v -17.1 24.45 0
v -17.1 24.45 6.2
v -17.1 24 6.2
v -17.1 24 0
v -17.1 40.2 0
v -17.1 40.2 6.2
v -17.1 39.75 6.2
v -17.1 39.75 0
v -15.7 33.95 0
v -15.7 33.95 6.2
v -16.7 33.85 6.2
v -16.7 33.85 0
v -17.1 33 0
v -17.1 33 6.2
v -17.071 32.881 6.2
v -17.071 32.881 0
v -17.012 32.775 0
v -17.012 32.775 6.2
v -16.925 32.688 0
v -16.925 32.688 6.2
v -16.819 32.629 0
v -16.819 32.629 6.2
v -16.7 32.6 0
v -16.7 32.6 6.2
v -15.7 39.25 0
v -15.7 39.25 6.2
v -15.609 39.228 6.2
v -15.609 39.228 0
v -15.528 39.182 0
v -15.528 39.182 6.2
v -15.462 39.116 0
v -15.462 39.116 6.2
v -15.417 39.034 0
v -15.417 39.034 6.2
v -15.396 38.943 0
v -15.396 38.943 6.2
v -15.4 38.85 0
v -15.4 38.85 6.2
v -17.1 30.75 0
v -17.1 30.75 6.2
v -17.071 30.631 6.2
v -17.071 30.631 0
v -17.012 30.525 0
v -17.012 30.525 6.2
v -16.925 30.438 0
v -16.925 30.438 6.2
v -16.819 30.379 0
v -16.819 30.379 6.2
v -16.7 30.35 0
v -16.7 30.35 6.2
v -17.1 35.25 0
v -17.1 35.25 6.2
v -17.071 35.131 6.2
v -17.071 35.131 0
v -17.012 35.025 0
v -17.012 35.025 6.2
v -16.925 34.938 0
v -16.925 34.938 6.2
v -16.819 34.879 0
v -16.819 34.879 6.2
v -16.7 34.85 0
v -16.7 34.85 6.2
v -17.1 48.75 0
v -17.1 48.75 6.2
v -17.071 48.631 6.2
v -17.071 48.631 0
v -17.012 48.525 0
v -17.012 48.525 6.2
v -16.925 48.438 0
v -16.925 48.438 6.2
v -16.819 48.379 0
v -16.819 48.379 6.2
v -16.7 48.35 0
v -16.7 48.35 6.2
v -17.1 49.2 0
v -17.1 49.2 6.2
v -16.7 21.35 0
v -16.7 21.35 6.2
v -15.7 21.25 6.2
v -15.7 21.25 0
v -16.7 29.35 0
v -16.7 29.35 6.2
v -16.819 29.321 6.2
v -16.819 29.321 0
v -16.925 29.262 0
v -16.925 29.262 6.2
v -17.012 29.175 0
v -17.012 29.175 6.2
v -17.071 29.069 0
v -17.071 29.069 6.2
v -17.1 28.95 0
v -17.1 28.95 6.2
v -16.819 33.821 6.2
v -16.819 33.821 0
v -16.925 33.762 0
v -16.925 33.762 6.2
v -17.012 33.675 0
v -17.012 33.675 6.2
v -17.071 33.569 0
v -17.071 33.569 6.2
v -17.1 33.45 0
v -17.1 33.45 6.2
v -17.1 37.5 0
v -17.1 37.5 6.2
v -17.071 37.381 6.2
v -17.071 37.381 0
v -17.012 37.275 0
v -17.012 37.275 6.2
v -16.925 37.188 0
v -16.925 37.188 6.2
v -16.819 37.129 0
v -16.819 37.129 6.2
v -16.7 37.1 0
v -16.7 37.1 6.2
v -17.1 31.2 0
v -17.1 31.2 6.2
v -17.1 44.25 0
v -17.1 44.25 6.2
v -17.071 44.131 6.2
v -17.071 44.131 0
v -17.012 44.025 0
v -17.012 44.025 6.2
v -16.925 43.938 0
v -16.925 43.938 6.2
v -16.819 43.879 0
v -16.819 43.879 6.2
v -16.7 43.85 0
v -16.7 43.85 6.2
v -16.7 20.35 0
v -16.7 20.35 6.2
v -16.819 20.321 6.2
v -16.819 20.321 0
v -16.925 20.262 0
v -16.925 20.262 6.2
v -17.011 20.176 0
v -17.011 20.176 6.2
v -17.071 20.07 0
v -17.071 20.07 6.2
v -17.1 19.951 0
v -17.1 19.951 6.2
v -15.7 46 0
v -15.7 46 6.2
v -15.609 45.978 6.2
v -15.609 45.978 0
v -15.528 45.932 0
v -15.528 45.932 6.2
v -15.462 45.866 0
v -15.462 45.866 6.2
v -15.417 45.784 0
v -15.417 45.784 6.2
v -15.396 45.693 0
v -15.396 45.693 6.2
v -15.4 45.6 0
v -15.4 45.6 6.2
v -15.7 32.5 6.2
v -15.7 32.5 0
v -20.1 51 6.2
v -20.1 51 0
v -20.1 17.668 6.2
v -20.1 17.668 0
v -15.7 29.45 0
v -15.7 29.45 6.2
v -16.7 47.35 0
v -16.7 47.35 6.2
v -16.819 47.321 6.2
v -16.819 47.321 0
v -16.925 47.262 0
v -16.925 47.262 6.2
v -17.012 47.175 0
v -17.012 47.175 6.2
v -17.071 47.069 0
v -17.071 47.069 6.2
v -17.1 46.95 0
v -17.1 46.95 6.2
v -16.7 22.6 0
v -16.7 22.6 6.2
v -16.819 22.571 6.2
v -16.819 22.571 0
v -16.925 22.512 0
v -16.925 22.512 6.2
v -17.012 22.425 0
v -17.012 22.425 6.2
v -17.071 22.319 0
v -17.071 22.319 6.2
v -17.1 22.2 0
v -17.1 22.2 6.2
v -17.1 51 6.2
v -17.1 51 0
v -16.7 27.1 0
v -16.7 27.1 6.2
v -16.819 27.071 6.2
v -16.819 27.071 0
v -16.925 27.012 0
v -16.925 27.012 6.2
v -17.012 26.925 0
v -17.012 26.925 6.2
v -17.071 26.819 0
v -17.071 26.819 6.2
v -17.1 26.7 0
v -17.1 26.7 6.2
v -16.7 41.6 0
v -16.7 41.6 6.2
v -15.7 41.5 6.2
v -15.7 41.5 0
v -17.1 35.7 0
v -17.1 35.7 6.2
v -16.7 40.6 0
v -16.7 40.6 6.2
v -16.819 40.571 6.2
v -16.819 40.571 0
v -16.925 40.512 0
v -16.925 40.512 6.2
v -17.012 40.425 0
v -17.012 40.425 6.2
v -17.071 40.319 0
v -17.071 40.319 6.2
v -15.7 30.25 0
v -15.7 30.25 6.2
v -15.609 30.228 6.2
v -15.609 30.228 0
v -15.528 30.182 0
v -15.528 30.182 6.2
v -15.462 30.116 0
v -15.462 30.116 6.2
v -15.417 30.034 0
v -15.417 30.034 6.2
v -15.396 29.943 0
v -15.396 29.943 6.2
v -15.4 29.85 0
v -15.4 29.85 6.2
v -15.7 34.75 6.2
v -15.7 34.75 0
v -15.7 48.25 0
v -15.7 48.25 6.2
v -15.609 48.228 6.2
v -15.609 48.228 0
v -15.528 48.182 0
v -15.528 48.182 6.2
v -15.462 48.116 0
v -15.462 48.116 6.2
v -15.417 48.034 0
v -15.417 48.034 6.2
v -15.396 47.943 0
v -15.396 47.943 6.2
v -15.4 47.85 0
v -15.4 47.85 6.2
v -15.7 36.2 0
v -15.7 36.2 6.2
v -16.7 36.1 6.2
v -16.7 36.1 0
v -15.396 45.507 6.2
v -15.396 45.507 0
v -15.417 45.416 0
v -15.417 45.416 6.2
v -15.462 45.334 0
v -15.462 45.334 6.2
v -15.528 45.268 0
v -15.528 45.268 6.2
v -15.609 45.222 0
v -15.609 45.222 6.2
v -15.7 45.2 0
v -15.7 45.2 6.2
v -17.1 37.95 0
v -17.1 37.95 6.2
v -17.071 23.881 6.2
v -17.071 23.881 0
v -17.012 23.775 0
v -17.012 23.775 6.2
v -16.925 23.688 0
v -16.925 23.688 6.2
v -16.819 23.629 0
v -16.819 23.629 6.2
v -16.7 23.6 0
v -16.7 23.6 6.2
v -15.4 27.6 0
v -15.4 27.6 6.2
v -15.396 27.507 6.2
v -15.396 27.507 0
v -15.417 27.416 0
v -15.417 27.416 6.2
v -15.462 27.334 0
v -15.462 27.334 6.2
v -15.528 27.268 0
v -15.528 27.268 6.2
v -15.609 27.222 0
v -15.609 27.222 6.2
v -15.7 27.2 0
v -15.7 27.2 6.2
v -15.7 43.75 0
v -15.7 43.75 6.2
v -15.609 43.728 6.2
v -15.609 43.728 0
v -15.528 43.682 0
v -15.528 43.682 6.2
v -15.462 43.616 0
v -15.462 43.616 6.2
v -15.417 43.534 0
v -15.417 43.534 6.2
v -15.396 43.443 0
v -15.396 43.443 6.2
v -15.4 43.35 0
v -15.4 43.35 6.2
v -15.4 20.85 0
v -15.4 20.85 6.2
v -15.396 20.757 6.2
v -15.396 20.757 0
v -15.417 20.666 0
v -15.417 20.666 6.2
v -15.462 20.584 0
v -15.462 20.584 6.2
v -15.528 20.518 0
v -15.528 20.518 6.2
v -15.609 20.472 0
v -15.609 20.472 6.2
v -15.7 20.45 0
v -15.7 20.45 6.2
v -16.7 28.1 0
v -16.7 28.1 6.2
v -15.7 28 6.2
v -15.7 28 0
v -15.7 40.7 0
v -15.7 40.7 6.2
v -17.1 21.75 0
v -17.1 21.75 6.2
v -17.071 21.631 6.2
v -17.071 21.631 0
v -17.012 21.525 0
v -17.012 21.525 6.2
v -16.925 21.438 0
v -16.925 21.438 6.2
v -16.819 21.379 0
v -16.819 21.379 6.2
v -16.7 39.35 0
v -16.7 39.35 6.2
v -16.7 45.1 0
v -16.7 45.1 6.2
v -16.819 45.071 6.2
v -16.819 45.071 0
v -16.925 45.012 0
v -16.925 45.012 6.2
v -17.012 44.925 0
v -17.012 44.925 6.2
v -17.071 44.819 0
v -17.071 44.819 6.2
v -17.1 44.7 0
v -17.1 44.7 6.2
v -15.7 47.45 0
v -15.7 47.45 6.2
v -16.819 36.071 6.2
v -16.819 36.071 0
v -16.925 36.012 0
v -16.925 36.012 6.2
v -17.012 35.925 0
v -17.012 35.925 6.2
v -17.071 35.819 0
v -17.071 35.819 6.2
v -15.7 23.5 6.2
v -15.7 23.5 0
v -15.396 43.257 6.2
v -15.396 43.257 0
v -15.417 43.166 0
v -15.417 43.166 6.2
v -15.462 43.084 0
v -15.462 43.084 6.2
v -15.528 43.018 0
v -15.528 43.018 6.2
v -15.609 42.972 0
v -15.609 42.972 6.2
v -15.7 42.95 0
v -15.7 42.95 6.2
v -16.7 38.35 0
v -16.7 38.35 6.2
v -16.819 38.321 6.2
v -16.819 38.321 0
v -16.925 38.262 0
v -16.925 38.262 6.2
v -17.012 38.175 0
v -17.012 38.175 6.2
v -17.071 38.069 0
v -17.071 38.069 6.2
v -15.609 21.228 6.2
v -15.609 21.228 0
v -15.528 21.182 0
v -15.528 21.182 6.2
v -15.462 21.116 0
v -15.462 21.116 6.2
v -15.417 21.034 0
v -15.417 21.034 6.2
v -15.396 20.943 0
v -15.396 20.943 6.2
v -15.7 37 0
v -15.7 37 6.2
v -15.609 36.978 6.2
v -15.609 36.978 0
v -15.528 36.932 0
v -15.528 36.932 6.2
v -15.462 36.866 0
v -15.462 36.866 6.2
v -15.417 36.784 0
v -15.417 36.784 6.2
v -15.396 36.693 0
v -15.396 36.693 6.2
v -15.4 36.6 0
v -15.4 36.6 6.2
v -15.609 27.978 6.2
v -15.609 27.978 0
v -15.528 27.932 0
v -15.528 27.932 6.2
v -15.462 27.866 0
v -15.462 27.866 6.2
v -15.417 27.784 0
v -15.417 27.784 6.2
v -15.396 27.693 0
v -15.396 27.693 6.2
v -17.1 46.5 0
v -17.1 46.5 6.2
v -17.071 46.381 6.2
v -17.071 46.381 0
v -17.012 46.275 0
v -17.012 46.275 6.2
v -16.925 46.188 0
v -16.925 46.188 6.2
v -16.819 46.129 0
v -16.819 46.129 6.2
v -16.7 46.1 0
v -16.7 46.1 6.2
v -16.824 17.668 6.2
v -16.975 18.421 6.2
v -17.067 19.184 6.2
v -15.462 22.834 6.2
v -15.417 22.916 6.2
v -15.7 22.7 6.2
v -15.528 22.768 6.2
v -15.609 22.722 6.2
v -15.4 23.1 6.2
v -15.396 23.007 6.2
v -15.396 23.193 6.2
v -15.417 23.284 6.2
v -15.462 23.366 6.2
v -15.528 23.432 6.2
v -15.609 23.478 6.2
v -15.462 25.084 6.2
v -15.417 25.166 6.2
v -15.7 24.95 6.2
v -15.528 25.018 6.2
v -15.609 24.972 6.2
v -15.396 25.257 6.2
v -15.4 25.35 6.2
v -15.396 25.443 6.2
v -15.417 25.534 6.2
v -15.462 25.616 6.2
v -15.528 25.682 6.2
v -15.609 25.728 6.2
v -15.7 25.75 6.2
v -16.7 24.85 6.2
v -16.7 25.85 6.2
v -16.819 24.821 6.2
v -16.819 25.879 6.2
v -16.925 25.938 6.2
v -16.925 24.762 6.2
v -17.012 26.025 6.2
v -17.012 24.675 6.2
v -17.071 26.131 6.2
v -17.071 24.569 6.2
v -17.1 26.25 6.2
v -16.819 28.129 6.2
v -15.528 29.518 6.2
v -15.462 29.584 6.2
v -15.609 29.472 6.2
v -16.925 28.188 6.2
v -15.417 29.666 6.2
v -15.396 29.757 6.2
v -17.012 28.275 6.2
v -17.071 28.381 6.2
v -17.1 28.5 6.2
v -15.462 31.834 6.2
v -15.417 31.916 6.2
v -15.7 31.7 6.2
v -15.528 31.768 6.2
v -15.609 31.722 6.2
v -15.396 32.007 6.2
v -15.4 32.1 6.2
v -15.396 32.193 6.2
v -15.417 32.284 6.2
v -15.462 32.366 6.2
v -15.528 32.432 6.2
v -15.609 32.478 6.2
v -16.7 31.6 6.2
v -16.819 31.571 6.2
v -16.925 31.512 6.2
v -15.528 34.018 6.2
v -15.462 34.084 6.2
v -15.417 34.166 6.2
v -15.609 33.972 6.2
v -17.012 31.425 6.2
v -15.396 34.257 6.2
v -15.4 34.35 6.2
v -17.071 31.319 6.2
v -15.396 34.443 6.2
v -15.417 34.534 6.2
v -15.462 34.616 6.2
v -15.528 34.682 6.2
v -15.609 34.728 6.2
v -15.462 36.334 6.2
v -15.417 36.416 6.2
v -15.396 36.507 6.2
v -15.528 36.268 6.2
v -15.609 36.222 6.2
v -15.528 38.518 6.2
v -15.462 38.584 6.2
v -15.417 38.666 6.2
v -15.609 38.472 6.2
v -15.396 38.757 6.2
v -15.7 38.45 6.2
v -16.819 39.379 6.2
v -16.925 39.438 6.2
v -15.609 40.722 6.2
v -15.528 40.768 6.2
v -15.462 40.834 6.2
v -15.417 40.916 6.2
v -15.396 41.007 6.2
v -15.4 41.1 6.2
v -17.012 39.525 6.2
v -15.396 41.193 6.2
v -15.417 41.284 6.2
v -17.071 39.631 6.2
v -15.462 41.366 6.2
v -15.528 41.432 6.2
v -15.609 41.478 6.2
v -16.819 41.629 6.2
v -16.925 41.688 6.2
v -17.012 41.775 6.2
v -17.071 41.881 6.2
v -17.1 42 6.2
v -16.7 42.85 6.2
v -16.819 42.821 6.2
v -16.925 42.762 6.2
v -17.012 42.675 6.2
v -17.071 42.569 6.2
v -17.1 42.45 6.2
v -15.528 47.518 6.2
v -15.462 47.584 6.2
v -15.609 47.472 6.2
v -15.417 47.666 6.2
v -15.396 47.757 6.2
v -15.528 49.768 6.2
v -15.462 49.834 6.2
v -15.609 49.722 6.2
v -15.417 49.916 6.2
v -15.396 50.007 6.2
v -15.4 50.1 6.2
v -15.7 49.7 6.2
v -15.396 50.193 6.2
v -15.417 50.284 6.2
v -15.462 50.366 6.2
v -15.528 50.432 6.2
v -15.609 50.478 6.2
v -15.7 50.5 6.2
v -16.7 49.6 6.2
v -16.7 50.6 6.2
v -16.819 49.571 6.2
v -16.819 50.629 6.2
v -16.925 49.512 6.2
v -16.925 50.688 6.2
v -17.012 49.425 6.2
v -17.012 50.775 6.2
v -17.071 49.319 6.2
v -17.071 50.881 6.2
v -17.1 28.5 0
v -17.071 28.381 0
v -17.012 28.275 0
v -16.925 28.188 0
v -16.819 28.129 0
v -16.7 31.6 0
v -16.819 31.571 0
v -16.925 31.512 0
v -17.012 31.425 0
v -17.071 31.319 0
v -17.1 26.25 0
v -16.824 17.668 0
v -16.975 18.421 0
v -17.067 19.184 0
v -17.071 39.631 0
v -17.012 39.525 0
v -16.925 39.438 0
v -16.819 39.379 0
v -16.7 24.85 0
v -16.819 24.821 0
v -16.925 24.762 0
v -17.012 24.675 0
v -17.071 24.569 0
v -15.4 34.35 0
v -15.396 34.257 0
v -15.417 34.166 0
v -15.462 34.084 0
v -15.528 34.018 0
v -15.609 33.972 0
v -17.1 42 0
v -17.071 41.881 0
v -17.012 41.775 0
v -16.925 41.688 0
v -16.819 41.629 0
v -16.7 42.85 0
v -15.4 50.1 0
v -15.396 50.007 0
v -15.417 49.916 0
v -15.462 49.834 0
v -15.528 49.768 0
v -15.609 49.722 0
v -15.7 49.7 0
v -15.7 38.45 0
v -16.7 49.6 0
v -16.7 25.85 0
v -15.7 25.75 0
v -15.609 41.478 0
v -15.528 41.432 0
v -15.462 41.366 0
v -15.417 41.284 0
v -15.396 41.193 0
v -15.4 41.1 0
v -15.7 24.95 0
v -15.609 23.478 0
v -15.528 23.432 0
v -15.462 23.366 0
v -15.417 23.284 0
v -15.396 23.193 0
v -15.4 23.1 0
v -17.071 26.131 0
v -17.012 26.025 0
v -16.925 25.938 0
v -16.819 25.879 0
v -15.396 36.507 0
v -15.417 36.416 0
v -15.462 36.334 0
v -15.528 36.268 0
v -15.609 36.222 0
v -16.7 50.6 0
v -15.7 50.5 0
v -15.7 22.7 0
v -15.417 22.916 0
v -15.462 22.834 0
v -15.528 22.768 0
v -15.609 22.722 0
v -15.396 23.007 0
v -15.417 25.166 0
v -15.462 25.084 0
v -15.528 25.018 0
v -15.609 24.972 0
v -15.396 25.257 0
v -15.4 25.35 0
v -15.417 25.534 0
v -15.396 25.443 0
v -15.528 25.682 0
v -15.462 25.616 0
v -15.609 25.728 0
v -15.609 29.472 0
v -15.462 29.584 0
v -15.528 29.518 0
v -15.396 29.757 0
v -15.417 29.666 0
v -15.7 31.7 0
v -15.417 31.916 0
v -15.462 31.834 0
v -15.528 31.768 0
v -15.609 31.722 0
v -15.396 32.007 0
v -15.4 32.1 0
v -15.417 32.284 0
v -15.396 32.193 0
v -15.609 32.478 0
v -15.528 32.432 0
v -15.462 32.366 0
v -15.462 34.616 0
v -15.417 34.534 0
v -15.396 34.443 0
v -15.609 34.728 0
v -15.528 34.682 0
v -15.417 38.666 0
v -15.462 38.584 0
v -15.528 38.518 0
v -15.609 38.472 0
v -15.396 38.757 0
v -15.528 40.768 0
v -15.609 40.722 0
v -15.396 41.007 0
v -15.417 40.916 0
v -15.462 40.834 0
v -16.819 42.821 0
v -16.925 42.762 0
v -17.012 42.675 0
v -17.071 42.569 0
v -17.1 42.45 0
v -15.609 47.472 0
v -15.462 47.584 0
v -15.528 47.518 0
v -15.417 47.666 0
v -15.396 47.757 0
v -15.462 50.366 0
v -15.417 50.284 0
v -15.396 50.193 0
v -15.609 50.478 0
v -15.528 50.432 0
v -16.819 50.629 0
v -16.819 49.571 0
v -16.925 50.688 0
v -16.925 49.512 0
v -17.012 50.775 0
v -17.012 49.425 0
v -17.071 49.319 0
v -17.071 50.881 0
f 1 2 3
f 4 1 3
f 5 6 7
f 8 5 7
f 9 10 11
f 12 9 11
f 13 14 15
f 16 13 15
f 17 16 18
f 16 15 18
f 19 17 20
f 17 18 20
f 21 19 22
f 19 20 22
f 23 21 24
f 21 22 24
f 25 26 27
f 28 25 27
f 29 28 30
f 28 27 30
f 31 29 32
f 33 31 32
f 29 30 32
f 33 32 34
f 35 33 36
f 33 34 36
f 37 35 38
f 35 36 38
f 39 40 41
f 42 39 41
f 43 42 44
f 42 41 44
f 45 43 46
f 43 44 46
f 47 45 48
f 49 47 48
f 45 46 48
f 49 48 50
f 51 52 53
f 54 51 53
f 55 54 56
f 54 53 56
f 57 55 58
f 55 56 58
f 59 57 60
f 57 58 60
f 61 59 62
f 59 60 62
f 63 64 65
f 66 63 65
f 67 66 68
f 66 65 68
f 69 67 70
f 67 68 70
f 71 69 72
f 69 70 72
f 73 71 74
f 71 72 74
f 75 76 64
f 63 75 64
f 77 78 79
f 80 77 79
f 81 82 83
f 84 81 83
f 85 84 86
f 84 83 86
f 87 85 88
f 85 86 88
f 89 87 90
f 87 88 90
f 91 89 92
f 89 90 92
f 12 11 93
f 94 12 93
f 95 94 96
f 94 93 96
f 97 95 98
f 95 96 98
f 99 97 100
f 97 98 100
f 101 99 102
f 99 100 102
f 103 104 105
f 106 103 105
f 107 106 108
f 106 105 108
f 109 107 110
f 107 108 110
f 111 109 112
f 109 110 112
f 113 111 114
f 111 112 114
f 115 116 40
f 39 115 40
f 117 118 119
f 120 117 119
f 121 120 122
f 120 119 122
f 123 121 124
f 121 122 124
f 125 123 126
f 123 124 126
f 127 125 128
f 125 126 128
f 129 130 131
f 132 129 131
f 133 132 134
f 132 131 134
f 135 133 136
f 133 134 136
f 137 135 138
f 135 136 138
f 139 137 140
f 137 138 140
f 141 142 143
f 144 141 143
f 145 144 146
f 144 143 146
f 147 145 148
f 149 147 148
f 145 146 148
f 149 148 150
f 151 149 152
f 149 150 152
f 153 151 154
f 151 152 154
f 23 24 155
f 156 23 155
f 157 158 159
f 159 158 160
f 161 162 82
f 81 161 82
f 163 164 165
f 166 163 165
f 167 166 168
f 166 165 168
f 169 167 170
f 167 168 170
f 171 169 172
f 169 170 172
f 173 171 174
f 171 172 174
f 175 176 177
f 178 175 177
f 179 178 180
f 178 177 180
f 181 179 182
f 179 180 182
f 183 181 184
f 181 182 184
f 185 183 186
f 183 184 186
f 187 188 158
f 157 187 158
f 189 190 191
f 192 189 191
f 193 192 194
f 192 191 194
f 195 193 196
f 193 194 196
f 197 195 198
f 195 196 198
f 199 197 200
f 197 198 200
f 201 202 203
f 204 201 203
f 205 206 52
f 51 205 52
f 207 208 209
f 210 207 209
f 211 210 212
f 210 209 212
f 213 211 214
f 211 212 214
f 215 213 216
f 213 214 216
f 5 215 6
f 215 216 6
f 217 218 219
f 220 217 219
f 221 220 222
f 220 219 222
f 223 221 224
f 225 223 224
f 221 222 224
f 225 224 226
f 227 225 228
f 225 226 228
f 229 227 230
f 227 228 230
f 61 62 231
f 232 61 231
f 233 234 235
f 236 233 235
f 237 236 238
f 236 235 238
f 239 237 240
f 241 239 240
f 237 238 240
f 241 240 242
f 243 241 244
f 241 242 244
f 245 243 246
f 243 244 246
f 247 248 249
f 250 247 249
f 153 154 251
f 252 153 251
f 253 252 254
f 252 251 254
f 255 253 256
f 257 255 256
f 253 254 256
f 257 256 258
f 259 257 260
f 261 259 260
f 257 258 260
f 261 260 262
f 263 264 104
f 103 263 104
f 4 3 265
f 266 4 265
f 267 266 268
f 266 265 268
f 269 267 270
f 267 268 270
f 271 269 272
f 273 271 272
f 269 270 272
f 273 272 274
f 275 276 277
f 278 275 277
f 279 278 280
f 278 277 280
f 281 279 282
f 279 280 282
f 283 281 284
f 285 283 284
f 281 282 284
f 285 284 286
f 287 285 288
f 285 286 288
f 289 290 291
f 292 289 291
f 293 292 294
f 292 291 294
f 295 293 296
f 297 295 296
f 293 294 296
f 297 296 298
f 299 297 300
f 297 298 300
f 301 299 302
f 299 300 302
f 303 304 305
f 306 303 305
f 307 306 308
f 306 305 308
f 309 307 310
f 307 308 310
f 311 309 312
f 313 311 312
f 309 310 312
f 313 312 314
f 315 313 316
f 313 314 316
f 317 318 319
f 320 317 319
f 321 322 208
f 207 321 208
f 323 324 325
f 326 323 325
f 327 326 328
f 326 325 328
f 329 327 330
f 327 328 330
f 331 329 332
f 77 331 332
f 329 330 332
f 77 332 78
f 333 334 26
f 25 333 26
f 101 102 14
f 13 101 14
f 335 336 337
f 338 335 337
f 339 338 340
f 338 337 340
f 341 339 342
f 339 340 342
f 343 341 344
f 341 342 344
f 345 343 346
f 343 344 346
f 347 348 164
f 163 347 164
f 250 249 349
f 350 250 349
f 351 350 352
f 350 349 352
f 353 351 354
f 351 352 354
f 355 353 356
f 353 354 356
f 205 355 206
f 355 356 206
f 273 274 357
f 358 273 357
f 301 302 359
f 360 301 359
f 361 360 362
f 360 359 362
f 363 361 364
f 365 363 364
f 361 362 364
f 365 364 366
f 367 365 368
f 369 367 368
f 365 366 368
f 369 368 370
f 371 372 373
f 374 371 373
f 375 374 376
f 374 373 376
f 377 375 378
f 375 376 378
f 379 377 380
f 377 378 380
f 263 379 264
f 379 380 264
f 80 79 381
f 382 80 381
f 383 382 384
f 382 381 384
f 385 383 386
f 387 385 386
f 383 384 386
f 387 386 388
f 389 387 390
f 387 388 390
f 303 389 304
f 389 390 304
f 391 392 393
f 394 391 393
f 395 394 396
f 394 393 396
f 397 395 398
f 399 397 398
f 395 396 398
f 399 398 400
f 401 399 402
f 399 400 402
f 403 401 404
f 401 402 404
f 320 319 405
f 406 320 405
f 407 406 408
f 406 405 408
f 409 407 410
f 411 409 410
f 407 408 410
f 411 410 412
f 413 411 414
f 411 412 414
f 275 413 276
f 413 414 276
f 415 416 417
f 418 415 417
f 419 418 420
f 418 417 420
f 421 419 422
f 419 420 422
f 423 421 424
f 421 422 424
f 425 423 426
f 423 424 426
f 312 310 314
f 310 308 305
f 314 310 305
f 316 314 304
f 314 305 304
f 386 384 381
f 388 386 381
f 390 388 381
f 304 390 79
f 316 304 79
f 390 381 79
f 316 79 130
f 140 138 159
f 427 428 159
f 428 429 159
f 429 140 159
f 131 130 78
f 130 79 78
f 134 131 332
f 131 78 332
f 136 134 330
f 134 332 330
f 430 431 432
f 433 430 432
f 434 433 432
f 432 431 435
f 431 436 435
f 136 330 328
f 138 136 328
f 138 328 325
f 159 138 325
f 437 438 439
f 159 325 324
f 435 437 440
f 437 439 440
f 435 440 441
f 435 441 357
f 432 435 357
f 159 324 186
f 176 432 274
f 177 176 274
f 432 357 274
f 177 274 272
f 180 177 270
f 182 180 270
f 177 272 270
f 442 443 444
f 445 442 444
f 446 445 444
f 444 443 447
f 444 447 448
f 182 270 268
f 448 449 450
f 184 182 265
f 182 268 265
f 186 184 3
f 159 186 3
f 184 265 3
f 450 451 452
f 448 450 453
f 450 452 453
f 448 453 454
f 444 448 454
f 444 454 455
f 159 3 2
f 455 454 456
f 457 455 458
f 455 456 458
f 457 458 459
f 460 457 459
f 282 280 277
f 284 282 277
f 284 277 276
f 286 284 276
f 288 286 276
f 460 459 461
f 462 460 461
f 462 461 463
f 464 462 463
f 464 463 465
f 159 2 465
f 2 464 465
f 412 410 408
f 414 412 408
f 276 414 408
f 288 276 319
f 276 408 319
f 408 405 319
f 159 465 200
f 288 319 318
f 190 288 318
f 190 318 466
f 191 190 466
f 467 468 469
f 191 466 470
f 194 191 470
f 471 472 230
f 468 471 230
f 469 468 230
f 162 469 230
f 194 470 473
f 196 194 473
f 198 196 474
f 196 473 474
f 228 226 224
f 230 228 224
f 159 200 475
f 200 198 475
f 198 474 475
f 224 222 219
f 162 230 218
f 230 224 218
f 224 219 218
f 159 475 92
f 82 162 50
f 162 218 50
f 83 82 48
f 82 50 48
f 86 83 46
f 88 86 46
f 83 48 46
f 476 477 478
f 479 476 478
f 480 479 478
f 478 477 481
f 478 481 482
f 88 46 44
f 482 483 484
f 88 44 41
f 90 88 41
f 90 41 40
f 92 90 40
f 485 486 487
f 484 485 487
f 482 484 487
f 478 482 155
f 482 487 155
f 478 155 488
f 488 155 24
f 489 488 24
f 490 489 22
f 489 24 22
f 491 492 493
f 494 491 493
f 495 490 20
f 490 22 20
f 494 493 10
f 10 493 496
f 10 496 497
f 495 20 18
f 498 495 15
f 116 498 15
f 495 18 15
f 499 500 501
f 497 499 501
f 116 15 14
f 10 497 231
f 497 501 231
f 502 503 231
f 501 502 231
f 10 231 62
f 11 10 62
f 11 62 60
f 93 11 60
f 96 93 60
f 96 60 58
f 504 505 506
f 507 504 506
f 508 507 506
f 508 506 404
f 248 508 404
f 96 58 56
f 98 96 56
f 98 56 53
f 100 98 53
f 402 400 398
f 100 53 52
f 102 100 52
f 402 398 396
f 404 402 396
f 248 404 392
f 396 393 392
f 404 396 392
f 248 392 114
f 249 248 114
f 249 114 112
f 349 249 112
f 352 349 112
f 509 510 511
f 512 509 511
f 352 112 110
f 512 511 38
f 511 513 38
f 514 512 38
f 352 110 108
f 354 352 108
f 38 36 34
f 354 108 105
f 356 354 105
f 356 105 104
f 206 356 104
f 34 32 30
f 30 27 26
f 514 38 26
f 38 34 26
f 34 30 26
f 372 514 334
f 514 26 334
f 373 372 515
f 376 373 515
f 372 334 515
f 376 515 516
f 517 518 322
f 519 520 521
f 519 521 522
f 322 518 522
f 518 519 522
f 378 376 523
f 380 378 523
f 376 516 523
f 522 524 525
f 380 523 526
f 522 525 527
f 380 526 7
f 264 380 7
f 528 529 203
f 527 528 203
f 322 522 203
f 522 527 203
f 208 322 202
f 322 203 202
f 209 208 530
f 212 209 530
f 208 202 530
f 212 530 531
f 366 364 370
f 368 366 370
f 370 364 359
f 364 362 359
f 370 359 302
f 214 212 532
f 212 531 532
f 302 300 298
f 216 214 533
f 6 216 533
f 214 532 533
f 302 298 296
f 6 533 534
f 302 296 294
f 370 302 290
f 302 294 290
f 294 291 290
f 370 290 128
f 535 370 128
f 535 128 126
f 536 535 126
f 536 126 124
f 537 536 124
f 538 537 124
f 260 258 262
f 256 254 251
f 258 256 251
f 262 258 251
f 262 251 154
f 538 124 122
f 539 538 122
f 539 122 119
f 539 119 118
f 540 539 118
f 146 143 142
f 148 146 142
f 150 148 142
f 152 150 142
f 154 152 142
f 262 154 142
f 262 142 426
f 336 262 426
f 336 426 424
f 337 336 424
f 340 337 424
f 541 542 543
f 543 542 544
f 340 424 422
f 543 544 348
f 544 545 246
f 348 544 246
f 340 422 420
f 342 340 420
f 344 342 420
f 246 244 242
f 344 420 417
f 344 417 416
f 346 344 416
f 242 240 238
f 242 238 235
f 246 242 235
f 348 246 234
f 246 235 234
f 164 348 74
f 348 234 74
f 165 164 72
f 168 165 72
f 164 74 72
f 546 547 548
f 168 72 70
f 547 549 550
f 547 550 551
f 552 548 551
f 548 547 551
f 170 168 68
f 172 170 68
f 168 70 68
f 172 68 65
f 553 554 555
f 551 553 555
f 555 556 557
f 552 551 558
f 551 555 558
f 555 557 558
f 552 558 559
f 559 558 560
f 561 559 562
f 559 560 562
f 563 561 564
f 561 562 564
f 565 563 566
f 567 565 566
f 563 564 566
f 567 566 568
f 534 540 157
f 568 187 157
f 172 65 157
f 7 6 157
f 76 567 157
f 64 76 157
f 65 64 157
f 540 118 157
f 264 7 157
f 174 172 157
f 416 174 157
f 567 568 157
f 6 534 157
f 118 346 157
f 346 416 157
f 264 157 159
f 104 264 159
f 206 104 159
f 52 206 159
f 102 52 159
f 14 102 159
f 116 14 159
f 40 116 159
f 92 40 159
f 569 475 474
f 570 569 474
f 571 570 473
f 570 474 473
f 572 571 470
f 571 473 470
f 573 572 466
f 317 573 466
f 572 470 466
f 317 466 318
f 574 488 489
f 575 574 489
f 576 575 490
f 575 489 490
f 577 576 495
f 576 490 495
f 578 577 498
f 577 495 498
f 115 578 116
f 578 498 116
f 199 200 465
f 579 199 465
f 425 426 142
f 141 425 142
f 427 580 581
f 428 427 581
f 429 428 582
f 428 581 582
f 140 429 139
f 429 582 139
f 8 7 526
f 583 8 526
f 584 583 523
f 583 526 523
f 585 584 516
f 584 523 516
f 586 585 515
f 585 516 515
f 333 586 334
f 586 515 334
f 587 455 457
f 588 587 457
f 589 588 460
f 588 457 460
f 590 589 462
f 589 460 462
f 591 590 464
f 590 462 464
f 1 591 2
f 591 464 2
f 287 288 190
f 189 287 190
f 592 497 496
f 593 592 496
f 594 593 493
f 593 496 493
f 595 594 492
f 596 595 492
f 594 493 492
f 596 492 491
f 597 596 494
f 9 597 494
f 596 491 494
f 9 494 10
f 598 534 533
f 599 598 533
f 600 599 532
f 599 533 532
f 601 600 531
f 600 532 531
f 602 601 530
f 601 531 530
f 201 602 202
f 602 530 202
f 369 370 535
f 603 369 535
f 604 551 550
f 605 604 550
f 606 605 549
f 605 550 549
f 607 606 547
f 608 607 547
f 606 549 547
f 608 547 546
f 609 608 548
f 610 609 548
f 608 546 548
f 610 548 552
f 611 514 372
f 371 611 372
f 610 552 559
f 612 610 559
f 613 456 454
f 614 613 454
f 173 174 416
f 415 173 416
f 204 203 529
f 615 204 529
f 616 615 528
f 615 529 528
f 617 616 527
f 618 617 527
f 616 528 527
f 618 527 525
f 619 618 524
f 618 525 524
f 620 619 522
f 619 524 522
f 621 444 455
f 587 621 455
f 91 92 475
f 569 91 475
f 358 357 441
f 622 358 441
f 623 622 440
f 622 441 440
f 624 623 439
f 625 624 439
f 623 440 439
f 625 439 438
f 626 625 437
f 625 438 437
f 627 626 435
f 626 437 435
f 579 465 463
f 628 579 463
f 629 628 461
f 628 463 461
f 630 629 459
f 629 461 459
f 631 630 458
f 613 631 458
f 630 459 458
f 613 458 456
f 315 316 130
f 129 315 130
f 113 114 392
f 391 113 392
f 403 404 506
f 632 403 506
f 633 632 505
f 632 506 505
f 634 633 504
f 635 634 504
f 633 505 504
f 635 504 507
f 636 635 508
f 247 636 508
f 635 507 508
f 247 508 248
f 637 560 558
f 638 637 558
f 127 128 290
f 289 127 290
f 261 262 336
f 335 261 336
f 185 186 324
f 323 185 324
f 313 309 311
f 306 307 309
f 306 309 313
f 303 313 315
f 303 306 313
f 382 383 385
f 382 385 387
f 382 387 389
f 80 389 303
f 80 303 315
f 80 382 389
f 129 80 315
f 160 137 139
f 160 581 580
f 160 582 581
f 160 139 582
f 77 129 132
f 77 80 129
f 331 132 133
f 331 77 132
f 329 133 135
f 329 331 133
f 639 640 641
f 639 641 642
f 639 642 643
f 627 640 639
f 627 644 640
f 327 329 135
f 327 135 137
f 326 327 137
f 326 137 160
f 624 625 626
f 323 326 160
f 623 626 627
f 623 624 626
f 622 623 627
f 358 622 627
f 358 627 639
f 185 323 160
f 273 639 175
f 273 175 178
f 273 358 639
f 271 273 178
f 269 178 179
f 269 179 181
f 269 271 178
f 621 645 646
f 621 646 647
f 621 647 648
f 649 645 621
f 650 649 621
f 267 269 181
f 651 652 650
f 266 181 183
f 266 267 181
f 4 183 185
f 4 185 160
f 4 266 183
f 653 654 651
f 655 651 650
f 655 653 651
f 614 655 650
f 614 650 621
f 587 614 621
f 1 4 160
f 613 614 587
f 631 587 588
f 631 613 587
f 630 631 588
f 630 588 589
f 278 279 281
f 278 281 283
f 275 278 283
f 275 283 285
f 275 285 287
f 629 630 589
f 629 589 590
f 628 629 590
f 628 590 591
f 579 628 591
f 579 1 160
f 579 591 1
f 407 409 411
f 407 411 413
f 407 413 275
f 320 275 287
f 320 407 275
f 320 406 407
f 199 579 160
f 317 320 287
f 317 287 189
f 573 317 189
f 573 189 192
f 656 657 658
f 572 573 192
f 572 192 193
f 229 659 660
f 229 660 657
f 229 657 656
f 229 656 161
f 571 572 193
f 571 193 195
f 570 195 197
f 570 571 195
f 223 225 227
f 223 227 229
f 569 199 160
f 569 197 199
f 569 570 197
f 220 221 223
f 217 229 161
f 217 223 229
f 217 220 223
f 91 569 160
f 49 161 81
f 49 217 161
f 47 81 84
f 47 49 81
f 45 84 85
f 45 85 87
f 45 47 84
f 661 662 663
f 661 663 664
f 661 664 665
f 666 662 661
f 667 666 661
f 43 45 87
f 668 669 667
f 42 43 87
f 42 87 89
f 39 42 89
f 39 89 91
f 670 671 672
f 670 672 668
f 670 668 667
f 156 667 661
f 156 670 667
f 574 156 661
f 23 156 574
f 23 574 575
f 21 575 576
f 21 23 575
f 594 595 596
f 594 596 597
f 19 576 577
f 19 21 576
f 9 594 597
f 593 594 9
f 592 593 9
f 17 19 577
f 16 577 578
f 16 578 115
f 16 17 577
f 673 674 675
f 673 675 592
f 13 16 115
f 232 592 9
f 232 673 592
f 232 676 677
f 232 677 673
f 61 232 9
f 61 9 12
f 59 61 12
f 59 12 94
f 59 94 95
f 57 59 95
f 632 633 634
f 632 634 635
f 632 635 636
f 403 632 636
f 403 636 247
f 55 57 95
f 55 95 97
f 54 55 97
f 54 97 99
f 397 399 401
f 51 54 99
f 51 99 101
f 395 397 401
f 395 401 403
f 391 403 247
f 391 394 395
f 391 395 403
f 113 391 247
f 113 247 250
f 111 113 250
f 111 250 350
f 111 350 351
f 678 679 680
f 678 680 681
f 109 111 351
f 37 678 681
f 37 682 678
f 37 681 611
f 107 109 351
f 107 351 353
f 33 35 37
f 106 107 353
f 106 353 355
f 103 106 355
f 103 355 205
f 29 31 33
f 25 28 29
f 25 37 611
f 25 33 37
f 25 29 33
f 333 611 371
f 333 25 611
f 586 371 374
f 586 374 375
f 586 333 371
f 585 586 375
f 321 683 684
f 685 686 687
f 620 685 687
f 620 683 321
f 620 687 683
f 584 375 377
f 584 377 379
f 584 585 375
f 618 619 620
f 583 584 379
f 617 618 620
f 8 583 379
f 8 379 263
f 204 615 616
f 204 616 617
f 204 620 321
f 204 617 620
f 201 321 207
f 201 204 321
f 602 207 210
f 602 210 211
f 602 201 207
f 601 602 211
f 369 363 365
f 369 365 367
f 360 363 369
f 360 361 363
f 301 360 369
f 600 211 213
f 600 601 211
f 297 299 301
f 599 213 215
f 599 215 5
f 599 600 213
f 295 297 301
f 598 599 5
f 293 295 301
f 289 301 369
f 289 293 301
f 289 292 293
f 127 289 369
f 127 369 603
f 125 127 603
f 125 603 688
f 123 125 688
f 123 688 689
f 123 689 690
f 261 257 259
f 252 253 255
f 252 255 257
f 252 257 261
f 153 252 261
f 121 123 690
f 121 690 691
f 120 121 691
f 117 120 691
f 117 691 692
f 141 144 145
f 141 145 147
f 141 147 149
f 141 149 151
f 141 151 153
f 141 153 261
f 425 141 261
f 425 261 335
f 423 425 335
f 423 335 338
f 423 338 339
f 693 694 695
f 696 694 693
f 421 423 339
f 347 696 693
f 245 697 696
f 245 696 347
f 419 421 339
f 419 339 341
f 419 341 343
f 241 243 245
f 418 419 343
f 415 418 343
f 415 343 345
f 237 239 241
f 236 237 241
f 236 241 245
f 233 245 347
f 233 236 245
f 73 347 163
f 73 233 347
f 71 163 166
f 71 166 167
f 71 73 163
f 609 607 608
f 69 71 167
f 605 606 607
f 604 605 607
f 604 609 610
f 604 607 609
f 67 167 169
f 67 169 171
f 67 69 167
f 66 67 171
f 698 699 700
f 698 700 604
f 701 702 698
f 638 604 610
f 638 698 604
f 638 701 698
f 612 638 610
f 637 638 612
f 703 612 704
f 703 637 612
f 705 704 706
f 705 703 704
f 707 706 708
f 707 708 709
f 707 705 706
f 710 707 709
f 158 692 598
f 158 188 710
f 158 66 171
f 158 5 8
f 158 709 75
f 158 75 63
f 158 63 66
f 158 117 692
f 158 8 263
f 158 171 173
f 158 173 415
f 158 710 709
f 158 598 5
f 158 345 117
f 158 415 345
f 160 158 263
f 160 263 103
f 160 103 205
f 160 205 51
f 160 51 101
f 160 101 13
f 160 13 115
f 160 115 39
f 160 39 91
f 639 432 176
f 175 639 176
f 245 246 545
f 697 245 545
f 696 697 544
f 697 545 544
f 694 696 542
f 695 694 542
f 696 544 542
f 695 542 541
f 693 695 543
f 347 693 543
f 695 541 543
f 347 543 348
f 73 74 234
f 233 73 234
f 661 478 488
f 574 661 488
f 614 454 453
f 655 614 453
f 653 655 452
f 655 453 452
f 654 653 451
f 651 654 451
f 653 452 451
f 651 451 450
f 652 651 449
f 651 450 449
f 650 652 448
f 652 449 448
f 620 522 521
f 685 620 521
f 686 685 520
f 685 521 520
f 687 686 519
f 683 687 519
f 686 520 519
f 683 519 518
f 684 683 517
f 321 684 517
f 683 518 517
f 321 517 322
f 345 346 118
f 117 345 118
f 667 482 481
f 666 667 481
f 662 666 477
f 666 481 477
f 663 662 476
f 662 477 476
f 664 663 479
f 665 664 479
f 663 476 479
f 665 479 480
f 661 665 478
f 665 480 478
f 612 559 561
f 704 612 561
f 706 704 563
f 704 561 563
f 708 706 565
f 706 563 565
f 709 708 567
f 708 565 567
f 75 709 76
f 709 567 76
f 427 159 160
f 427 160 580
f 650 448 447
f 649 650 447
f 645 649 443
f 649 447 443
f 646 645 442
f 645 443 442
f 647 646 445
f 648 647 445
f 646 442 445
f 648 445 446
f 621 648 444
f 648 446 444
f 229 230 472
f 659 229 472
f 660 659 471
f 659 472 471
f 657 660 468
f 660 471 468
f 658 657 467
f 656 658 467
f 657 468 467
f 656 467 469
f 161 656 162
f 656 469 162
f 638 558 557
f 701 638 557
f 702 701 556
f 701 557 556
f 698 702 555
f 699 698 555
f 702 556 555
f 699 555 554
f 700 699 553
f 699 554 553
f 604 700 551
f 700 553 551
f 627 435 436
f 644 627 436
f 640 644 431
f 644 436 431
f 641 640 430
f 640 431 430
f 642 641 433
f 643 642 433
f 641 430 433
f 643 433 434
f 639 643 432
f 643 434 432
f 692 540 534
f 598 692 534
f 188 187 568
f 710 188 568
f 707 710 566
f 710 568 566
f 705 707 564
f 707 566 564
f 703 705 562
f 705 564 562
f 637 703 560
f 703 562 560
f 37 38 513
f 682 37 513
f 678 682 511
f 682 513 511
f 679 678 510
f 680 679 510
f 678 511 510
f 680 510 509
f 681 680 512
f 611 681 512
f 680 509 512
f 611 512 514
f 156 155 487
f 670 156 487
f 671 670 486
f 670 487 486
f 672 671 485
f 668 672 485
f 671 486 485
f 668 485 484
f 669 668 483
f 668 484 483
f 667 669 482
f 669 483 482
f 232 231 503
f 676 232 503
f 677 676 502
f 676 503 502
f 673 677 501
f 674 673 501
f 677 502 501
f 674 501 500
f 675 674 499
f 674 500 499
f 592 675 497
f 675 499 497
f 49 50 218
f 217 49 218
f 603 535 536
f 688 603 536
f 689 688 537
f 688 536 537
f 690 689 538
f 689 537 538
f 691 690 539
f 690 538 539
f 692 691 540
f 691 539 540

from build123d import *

# Parameters (mm, degrees)
BOSS_EXTRUDE1_DEPTH     = 6.2
BOSS_EXTRUDE3_DEPTH     = 6.2
CUT_EXTRUDE5_DEPTH      = 59.510170056
CUT_EXTRUDE5_DEPTH_BACK = 59.510170056
SKETCH9_W               = 8.426821026
SKETCH9_H               = 53.817918331
CUT_EXTRUDE6_DEPTH      = 56.427921054
CUT_EXTRUDE6_DEPTH_BACK = 56.427921054
SKETCH10_W              = 41.255234225
SKETCH10_H              = 19.128366746


with BuildPart() as part:
    # Sketch1 → Boss-Extrude1 (new body)
    with BuildSketch(Plane.XY):
        with BuildLine():
            Line((-28, 0), (0, 0))
            Line((0, 0), (0, 10))
            Line((0, 10), (-7.1, 10))
            ThreePointArc((-7.1, 10), (-14.171067812, 12.928932188), (-17.1, 20))
            Line((-17.1, 20), (-17.1, 51))
            Line((-17.1, 51), (-20.1, 51))
            Line((-20.1, 51), (-20.1, 6))
            Line((-20.1, 6), (-24, 6))
            Line((-24, 6), (-24, 50))
            Line((-24, 50), (-28, 50))
            Line((-28, 50), (-28, 0))
        make_face()
    extrude(amount=BOSS_EXTRUDE1_DEPTH)

    # Sketch7 → Boss-Extrude3 (add)
    with BuildSketch(Plane.XY.offset(6.2)):
        with BuildLine():
            Line((-16.7, 50.6), (-15.7, 50.5))
            ThreePointArc((-15.7, 50.5), (-15.462165524, 50.365875857), (-15.4, 50.1))
            ThreePointArc((-15.4, 50.1), (-15.462165524, 49.834124143), (-15.7, 49.7))
            Line((-15.7, 49.7), (-16.7, 49.6))
            ThreePointArc((-16.7, 49.6), (-16.971392676, 49.471392676), (-17.1, 49.2))
            Line((-17.1, 49.2), (-17.1, 48.75))
            ThreePointArc((-17.1, 48.75), (-16.971392676, 48.478607324), (-16.7, 48.35))
            Line((-16.7, 48.35), (-15.7, 48.25))
            ThreePointArc((-15.7, 48.25), (-15.462165524, 48.115875857), (-15.4, 47.85))
            ThreePointArc((-15.4, 47.85), (-15.462165524, 47.584124143), (-15.7, 47.45))
            Line((-15.7, 47.45), (-16.7, 47.35))
            ThreePointArc((-16.7, 47.35), (-16.971392676, 47.221392676), (-17.1, 46.95))
            Line((-17.1, 46.95), (-17.1, 46.5))
            ThreePointArc((-17.1, 46.5), (-16.971392676, 46.228607324), (-16.7, 46.1))
            Line((-16.7, 46.1), (-15.7, 46))
            ThreePointArc((-15.7, 46), (-15.462165524, 45.865875857), (-15.4, 45.6))
            ThreePointArc((-15.4, 45.6), (-15.462165524, 45.334124143), (-15.7, 45.2))
            Line((-15.7, 45.2), (-16.7, 45.1))
            ThreePointArc((-16.7, 45.1), (-16.971392676, 44.971392676), (-17.1, 44.7))
            Line((-17.1, 44.7), (-17.1, 44.25))
            ThreePointArc((-17.1, 44.25), (-16.971392676, 43.978607324), (-16.7, 43.85))
            Line((-16.7, 43.85), (-15.7, 43.75))
            ThreePointArc((-15.7, 43.75), (-15.462165524, 43.615875857), (-15.4, 43.35))
            ThreePointArc((-15.4, 43.35), (-15.462165524, 43.084124143), (-15.7, 42.95))
            Line((-15.7, 42.95), (-16.7, 42.85))
            ThreePointArc((-16.7, 42.85), (-16.971392676, 42.721392676), (-17.1, 42.45))
            Line((-17.1, 42.45), (-17.1, 42))
            ThreePointArc((-17.1, 42), (-16.971392676, 41.728607324), (-16.7, 41.6))
            Line((-16.7, 41.6), (-15.7, 41.5))
            ThreePointArc((-15.7, 41.5), (-15.462165524, 41.365875857), (-15.4, 41.1))
            ThreePointArc((-15.4, 41.1), (-15.462165524, 40.834124143), (-15.7, 40.7))
            Line((-15.7, 40.7), (-16.7, 40.6))
            ThreePointArc((-16.7, 40.6), (-16.971392676, 40.471392676), (-17.1, 40.2))
            Line((-17.1, 40.2), (-17.1, 39.75))
            ThreePointArc((-17.1, 39.75), (-16.971392676, 39.478607324), (-16.7, 39.35))
            Line((-16.7, 39.35), (-15.7, 39.25))
            ThreePointArc((-15.7, 39.25), (-15.462165524, 39.115875857), (-15.4, 38.85))
            ThreePointArc((-15.4, 38.85), (-15.462165524, 38.584124143), (-15.7, 38.45))
            Line((-15.7, 38.45), (-16.7, 38.35))
            ThreePointArc((-16.7, 38.35), (-16.971392676, 38.221392676), (-17.1, 37.95))
            Line((-17.1, 37.95), (-17.1, 37.5))
            ThreePointArc((-17.1, 37.5), (-16.971392676, 37.228607324), (-16.7, 37.1))
            Line((-16.7, 37.1), (-15.7, 37))
            ThreePointArc((-15.7, 37), (-15.462165524, 36.865875857), (-15.4, 36.6))
            ThreePointArc((-15.4, 36.6), (-15.462165524, 36.334124143), (-15.7, 36.2))
            Line((-15.7, 36.2), (-16.7, 36.1))
            ThreePointArc((-16.7, 36.1), (-16.971392676, 35.971392676), (-17.1, 35.7))
            Line((-17.1, 35.7), (-17.1, 35.25))
            ThreePointArc((-17.1, 35.25), (-16.971392676, 34.978607324), (-16.7, 34.85))
            Line((-16.7, 34.85), (-15.7, 34.75))
            ThreePointArc((-15.7, 34.75), (-15.462165524, 34.615875857), (-15.4, 34.35))
            ThreePointArc((-15.4, 34.35), (-15.462165524, 34.084124143), (-15.7, 33.95))
            Line((-15.7, 33.95), (-16.7, 33.85))
            ThreePointArc((-16.7, 33.85), (-16.971392676, 33.721392676), (-17.1, 33.45))
            Line((-17.1, 33.45), (-17.1, 33))
            ThreePointArc((-17.1, 33), (-16.971392676, 32.728607324), (-16.7, 32.6))
            Line((-16.7, 32.6), (-15.7, 32.5))
            ThreePointArc((-15.7, 32.5), (-15.462165524, 32.365875857), (-15.4, 32.1))
            ThreePointArc((-15.4, 32.1), (-15.462165524, 31.834124143), (-15.7, 31.7))
            Line((-15.7, 31.7), (-16.7, 31.6))
            ThreePointArc((-16.7, 31.6), (-16.971392676, 31.471392676), (-17.1, 31.2))
            Line((-17.1, 31.2), (-17.1, 30.75))
            ThreePointArc((-17.1, 30.75), (-16.971392676, 30.478607324), (-16.7, 30.35))
            Line((-16.7, 30.35), (-15.7, 30.25))
            ThreePointArc((-15.7, 30.25), (-15.462165524, 30.115875857), (-15.4, 29.85))
            ThreePointArc((-15.4, 29.85), (-15.462165524, 29.584124143), (-15.7, 29.45))
            Line((-15.7, 29.45), (-16.7, 29.35))
            ThreePointArc((-16.7, 29.35), (-16.971392676, 29.221392676), (-17.1, 28.95))
            Line((-17.1, 28.95), (-17.1, 28.5))
            ThreePointArc((-17.1, 28.5), (-16.971392676, 28.228607324), (-16.7, 28.1))
            Line((-16.7, 28.1), (-15.7, 28))
            ThreePointArc((-15.7, 28), (-15.462165524, 27.865875857), (-15.4, 27.6))
            ThreePointArc((-15.4, 27.6), (-15.462165524, 27.334124143), (-15.7, 27.2))
            Line((-15.7, 27.2), (-16.7, 27.1))
            ThreePointArc((-16.7, 27.1), (-16.971392676, 26.971392676), (-17.1, 26.7))
            Line((-17.1, 26.7), (-17.1, 26.25))
            ThreePointArc((-17.1, 26.25), (-16.971392676, 25.978607324), (-16.7, 25.85))
            Line((-16.7, 25.85), (-15.7, 25.75))
            ThreePointArc((-15.7, 25.75), (-15.462165524, 25.615875857), (-15.4, 25.35))
            ThreePointArc((-15.4, 25.35), (-15.462165524, 25.084124143), (-15.7, 24.95))
            Line((-15.7, 24.95), (-16.7, 24.85))
            ThreePointArc((-16.7, 24.85), (-16.971392676, 24.721392676), (-17.1, 24.45))
            Line((-17.1, 24.45), (-17.1, 24))
            ThreePointArc((-17.1, 24), (-16.971392676, 23.728607324), (-16.7, 23.6))
            Line((-16.7, 23.6), (-15.7, 23.5))
            ThreePointArc((-15.7, 23.5), (-15.462165524, 23.365875857), (-15.4, 23.1))
            ThreePointArc((-15.4, 23.1), (-15.462165524, 22.834124143), (-15.7, 22.7))
            Line((-15.7, 22.7), (-16.7, 22.6))
            ThreePointArc((-16.7, 22.6), (-16.971392676, 22.471392676), (-17.1, 22.2))
            Line((-17.1, 22.2), (-17.1, 21.75))
            ThreePointArc((-17.1, 21.75), (-16.971392676, 21.478607324), (-16.7, 21.35))
            Line((-16.7, 21.35), (-15.7, 21.25))
            ThreePointArc((-15.7, 21.25), (-15.462165524, 21.115875857), (-15.4, 20.85))
            ThreePointArc((-15.4, 20.85), (-15.462165524, 20.584124143), (-15.7, 20.45))
            Line((-15.7, 20.45), (-16.7, 20.35))
            ThreePointArc((-16.7, 20.35), (-16.971392676, 20.221392676), (-17.1, 19.95))
            Line((-17.1, 19.95), (-17.956542174, 50.55))
            Line((-17.956542174, 50.55), (-17.1, 51))
            ThreePointArc((-17.1, 51), (-16.971392676, 50.728607324), (-16.7, 50.6))
        make_face()
    extrude(amount=-BOSS_EXTRUDE3_DEPTH)

    # Sketch9 → Cut-Extrude5 (cut, two sides: drawn at the far end of the back side and taken through both)
    with BuildSketch(Plane.XY.offset(6.2).offset(-CUT_EXTRUDE5_DEPTH_BACK)):
        with Locations((-25.017603177, 24.82792225)):
            Rectangle(SKETCH9_W, SKETCH9_H)
    extrude(amount=CUT_EXTRUDE5_DEPTH + CUT_EXTRUDE5_DEPTH_BACK, mode=Mode.SUBTRACT)

    # Sketch10 → Cut-Extrude6 (cut, two sides: drawn at the far end of the back side and taken through both)
    with BuildSketch(Plane.XY.offset(6.2).offset(-CUT_EXTRUDE6_DEPTH_BACK)):
        with Locations((-9.089657701, 8.103525919)):
            Rectangle(SKETCH10_W, SKETCH10_H)
    extrude(amount=CUT_EXTRUDE6_DEPTH + CUT_EXTRUDE6_DEPTH_BACK, mode=Mode.SUBTRACT)


solid = part.part
